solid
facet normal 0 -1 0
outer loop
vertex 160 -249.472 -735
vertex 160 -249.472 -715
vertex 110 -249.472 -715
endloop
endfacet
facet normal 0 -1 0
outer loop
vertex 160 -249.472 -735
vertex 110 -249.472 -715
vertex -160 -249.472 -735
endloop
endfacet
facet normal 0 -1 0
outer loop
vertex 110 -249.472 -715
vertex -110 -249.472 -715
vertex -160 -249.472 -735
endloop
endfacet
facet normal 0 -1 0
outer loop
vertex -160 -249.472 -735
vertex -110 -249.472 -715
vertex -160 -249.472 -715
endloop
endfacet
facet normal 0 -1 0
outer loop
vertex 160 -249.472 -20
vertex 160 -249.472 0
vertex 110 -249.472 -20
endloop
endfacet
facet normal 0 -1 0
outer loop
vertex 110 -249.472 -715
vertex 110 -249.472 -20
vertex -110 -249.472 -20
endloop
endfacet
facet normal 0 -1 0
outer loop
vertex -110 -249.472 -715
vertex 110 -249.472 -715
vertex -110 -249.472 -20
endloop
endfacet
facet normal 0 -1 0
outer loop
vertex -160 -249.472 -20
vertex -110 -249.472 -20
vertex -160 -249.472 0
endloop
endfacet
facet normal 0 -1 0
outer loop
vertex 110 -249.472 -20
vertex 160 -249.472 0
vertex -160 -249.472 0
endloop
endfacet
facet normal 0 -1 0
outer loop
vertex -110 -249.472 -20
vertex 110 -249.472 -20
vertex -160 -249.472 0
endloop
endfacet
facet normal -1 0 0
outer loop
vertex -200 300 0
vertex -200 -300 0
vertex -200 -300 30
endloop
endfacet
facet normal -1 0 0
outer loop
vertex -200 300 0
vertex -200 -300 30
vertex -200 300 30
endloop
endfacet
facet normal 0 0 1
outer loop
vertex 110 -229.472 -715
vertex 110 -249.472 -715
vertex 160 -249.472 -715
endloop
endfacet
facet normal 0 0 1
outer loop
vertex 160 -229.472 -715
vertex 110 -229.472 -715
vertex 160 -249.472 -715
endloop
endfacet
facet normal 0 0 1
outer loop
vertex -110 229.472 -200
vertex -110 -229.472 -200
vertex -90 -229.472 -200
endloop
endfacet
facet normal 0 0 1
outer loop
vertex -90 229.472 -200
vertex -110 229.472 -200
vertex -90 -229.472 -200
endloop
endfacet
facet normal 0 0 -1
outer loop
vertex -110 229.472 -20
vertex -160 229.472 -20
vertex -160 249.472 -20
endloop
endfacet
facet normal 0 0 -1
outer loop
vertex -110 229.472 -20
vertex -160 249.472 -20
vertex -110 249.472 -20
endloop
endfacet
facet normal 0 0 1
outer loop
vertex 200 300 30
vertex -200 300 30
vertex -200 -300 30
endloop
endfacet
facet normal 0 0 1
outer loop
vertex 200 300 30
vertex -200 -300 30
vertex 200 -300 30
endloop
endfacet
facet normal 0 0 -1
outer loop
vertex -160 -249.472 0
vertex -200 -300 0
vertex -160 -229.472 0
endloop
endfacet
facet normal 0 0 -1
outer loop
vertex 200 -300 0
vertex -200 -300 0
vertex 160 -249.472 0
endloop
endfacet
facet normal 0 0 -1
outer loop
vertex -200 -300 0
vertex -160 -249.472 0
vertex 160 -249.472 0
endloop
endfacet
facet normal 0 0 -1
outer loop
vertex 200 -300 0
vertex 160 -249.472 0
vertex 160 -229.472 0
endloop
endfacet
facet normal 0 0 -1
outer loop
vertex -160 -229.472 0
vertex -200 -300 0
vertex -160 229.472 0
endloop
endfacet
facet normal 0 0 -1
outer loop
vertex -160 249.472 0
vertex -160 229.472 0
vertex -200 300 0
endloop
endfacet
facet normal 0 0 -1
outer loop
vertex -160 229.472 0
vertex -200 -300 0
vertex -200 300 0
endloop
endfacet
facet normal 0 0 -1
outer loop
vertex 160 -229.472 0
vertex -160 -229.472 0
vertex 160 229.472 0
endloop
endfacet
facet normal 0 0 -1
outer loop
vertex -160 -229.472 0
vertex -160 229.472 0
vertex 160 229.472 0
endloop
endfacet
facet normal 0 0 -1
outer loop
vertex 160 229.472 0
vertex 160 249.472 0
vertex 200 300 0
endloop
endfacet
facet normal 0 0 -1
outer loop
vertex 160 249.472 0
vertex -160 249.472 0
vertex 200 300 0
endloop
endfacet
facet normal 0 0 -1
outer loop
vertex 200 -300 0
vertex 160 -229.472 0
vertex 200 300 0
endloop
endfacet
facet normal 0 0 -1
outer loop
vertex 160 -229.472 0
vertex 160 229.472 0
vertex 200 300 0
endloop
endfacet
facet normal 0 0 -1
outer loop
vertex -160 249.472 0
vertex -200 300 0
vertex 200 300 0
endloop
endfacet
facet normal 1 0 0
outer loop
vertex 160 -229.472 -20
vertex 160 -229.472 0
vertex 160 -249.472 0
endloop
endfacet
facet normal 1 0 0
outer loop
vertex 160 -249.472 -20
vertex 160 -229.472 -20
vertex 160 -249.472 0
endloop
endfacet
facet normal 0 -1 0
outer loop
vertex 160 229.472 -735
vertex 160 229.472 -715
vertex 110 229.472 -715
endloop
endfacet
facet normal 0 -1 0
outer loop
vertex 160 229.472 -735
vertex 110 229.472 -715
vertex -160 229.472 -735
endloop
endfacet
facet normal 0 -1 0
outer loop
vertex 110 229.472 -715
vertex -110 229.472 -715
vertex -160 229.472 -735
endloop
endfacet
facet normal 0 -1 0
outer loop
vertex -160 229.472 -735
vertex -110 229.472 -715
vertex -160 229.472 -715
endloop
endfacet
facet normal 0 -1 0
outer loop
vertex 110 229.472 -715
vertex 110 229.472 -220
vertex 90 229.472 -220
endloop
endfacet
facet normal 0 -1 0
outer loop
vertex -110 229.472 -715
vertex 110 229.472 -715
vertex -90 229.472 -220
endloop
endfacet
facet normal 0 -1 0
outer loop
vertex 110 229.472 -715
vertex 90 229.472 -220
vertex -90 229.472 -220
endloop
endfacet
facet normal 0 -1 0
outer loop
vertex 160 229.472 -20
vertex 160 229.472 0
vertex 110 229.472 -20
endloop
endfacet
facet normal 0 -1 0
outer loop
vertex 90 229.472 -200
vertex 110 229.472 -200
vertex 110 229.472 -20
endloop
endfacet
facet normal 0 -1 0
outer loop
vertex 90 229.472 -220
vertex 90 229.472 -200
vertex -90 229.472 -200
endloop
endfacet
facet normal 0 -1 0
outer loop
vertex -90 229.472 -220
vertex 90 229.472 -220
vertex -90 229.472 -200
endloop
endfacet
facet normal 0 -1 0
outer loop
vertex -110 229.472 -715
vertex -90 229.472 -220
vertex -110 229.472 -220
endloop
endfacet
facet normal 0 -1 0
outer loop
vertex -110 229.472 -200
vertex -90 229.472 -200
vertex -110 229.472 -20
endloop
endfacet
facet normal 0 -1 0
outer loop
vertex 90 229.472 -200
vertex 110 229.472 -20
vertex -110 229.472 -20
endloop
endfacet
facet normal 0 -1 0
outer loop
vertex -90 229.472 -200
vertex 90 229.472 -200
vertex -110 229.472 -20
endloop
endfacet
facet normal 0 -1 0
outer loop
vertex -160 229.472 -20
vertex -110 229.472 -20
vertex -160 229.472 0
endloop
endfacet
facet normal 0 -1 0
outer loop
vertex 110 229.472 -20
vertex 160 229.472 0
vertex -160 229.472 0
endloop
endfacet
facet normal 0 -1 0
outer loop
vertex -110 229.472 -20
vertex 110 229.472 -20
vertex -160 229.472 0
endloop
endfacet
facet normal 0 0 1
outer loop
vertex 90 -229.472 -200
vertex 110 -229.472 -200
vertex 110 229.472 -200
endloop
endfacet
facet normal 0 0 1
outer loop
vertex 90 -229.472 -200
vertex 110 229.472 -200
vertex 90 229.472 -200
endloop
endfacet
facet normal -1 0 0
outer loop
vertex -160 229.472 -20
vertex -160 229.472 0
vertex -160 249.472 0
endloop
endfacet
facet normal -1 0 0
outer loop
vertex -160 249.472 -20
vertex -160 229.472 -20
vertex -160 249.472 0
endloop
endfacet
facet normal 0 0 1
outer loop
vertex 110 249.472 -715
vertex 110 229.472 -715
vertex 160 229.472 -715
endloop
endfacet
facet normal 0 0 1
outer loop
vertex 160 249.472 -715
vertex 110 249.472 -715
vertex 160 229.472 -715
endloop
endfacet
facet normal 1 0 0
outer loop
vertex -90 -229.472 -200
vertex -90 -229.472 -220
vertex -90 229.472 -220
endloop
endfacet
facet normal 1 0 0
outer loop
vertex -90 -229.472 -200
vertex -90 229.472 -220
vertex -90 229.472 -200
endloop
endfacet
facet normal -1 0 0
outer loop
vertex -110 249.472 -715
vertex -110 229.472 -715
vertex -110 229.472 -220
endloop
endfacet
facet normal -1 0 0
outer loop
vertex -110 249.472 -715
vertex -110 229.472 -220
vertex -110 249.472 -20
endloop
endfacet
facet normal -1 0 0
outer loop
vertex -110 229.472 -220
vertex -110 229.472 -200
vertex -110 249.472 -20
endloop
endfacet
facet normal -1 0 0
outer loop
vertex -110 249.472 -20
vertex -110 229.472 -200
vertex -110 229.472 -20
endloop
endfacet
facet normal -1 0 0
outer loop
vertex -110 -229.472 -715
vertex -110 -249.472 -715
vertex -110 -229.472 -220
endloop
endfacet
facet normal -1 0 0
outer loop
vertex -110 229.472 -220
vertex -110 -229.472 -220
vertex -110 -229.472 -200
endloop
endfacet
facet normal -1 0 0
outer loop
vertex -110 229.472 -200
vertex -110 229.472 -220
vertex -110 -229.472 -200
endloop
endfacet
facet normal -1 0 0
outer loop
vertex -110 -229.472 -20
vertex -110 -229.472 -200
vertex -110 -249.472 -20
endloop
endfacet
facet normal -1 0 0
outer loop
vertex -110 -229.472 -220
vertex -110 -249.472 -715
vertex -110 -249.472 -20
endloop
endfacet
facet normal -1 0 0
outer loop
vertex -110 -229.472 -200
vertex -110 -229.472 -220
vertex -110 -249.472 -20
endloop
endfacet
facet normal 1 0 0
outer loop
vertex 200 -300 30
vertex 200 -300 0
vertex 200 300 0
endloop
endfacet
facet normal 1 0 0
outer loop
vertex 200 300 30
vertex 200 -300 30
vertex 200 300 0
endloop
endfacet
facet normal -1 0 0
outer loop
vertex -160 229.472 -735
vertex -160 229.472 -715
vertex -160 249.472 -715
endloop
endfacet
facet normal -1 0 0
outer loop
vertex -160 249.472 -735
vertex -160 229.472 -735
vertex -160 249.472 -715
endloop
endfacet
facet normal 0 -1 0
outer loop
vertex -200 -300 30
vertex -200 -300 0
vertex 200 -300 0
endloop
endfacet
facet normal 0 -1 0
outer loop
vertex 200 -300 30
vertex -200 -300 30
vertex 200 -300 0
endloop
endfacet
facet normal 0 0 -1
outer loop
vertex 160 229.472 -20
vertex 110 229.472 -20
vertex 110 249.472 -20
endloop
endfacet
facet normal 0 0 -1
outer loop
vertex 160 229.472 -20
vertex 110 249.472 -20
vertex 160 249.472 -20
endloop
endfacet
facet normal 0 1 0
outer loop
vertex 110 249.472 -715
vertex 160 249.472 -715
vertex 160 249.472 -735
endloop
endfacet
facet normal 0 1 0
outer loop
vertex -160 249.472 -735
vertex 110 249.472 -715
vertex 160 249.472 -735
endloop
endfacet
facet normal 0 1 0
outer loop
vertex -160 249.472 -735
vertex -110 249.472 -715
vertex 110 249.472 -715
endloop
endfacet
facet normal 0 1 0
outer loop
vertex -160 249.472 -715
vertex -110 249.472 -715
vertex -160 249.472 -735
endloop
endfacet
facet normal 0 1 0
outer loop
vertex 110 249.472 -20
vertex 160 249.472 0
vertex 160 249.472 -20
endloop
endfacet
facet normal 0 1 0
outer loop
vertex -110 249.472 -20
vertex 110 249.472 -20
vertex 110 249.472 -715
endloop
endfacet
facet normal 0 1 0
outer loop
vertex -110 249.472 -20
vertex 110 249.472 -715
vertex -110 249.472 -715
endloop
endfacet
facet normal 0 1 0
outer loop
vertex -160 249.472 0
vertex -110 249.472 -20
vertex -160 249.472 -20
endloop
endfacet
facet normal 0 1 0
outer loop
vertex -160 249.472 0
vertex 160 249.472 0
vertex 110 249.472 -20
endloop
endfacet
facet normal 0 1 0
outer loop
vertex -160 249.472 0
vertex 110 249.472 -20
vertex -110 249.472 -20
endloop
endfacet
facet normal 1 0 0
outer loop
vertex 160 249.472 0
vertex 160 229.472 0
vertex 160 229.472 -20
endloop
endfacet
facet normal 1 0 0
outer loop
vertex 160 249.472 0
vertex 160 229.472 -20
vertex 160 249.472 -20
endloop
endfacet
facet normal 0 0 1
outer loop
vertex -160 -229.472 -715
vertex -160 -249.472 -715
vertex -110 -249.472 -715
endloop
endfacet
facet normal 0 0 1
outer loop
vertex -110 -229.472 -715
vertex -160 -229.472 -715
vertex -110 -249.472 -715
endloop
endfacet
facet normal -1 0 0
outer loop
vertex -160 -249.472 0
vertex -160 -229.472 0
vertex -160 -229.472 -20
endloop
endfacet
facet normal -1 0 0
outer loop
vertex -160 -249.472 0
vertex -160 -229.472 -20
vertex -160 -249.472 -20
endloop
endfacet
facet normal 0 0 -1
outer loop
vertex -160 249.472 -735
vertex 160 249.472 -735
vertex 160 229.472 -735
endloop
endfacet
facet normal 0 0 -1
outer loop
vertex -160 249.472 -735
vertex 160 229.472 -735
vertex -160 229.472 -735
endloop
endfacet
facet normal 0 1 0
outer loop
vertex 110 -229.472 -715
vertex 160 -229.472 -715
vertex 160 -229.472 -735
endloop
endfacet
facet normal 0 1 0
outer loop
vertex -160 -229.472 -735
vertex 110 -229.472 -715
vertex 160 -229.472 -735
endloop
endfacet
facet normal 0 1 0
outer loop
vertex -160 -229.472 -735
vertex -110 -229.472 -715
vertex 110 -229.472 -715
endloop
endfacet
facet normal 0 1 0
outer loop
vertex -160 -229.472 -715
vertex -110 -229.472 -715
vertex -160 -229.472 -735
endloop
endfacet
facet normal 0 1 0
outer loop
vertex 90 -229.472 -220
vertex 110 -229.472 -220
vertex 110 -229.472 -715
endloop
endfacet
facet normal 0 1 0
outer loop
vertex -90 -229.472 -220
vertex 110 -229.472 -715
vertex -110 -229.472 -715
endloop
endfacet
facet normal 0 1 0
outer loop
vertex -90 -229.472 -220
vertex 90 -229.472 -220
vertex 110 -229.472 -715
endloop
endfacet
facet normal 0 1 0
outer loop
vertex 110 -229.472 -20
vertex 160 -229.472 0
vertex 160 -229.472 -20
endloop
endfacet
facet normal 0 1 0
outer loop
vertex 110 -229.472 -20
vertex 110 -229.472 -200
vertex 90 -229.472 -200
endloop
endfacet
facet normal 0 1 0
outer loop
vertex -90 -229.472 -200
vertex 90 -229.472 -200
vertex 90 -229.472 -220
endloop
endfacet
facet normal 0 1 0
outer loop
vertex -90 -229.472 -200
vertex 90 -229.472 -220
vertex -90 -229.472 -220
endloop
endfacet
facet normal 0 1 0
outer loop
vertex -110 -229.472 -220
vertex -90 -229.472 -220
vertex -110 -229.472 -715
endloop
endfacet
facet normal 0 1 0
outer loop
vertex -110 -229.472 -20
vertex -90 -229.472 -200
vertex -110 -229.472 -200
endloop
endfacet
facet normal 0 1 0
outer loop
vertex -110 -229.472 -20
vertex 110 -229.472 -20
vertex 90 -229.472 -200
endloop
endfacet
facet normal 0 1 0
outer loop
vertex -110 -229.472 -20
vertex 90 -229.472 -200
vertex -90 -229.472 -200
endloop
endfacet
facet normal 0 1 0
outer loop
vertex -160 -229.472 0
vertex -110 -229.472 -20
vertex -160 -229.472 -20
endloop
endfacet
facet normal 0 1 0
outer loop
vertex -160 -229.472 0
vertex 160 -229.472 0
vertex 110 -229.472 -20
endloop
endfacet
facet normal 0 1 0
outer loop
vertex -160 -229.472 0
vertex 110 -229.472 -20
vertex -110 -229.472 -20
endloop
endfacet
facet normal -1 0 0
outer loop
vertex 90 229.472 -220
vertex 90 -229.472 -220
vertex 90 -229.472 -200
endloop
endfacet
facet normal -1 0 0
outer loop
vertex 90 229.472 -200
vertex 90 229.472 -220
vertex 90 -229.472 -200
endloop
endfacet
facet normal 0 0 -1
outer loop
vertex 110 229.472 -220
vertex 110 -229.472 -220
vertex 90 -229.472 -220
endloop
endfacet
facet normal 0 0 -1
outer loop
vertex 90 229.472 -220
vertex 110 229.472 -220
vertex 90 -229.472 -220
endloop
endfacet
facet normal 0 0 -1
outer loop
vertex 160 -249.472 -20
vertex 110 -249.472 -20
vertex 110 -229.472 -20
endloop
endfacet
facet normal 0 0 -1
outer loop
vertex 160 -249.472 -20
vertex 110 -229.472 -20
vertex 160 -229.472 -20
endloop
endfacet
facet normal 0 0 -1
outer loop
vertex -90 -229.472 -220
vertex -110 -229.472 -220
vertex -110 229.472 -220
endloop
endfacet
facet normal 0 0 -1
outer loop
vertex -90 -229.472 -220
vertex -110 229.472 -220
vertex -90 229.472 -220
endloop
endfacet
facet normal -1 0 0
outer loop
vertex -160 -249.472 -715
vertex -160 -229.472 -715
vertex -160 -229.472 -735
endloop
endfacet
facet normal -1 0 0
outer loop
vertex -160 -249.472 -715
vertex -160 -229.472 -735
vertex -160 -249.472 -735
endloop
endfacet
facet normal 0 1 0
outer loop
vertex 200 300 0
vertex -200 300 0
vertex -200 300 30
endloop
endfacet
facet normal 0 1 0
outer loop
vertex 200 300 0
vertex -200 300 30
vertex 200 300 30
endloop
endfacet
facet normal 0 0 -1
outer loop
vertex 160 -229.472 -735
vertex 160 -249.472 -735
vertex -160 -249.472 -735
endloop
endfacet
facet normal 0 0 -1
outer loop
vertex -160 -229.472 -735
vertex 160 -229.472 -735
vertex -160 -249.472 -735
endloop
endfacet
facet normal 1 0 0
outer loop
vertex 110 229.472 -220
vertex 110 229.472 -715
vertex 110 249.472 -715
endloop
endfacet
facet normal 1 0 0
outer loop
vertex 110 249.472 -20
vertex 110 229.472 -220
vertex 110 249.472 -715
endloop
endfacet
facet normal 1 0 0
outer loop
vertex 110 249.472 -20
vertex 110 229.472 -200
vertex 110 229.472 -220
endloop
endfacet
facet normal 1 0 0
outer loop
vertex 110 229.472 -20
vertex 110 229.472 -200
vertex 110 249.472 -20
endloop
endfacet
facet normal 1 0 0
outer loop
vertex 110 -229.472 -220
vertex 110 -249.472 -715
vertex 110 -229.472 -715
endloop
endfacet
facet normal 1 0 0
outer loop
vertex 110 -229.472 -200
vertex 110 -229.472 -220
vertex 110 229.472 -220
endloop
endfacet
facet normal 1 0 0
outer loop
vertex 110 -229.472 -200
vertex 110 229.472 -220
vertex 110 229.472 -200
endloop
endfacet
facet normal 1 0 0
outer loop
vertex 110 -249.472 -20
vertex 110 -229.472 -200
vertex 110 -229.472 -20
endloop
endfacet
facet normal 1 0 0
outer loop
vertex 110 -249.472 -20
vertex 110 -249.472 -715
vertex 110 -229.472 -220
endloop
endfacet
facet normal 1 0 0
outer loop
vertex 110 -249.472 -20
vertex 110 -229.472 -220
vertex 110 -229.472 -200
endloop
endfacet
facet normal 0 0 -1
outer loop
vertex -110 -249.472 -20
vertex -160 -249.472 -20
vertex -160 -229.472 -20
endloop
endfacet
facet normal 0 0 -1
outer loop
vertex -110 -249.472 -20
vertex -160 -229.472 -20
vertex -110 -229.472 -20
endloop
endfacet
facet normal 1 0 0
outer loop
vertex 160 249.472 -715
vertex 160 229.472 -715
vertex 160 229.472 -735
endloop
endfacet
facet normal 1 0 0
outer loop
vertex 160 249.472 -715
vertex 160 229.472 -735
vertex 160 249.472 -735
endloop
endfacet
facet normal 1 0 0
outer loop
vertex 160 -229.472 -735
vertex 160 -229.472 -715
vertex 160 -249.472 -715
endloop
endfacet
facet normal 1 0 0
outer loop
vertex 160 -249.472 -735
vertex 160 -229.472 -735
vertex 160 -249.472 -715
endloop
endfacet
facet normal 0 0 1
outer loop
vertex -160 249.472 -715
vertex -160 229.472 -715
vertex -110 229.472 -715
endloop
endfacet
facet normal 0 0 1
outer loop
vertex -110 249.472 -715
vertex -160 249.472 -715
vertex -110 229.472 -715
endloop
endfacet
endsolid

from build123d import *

# Parameters (mm, degrees)
CROQUIS1_W              = 400
CROQUIS1_H              = 600
SALIENTE_EXTRUIR1_DEPTH = 30
CROQUIS3_W              = 320
CROQUIS3_H              = 20
SALIENTE_EXTRUIR2_DEPTH = 735
CROQUIS4_W              = 50
CROQUIS4_H              = 695
CORTAR_EXTRUIR1_DEPTH   = 550.471728
CROQUIS5_W              = 20
CROQUIS5_H              = 20
SALIENTE_EXTRUIR3_DEPTH = 458.943456


with BuildPart() as part:
    # Croquis1 → Saliente-Extruir1 (new body)
    with BuildSketch(Plane.XY):
        Rectangle(CROQUIS1_W, CROQUIS1_H)
    extrude(amount=SALIENTE_EXTRUIR1_DEPTH)

    # Croquis3 → Saliente-Extruir2 (add)
    with BuildSketch(Plane(origin=(0, 0, 0), x_dir=(-1, 0, 0), z_dir=(0, 0, -1))):
        with Locations((0, 239.471728)):
            Rectangle(CROQUIS3_W, CROQUIS3_H)
    saliente_extruir2 = extrude(amount=SALIENTE_EXTRUIR2_DEPTH)

    # Simetría1: Saliente-Extruir2 across plane
    add(saliente_extruir2.mirror(Plane.ZX))

    # Croquis4 → Cortar-Extruir1 (cut, through all)
    with BuildSketch(Plane.XZ.offset(249.471728)):
        with Locations((-135, -367.5)):
            Rectangle(CROQUIS4_W, CROQUIS4_H)
        with Locations((135, -367.5)):
            Rectangle(CROQUIS4_W, CROQUIS4_H)
    extrude(amount=-CORTAR_EXTRUIR1_DEPTH, mode=Mode.SUBTRACT)

    # Croquis5 → Saliente-Extruir3 (add)
    with BuildSketch(Plane.XZ.offset(-229.471728)):
        with Locations((-100, -210)):
            Rectangle(CROQUIS5_W, CROQUIS5_H)
    saliente_extruir3 = extrude(amount=SALIENTE_EXTRUIR3_DEPTH)

    # Simetría2: Saliente-Extruir3 across plane
    add(saliente_extruir3.mirror(Plane(origin=(0, 0, 0), x_dir=(0, 0, 1), z_dir=(1, 0, 0))))


solid = part.part
